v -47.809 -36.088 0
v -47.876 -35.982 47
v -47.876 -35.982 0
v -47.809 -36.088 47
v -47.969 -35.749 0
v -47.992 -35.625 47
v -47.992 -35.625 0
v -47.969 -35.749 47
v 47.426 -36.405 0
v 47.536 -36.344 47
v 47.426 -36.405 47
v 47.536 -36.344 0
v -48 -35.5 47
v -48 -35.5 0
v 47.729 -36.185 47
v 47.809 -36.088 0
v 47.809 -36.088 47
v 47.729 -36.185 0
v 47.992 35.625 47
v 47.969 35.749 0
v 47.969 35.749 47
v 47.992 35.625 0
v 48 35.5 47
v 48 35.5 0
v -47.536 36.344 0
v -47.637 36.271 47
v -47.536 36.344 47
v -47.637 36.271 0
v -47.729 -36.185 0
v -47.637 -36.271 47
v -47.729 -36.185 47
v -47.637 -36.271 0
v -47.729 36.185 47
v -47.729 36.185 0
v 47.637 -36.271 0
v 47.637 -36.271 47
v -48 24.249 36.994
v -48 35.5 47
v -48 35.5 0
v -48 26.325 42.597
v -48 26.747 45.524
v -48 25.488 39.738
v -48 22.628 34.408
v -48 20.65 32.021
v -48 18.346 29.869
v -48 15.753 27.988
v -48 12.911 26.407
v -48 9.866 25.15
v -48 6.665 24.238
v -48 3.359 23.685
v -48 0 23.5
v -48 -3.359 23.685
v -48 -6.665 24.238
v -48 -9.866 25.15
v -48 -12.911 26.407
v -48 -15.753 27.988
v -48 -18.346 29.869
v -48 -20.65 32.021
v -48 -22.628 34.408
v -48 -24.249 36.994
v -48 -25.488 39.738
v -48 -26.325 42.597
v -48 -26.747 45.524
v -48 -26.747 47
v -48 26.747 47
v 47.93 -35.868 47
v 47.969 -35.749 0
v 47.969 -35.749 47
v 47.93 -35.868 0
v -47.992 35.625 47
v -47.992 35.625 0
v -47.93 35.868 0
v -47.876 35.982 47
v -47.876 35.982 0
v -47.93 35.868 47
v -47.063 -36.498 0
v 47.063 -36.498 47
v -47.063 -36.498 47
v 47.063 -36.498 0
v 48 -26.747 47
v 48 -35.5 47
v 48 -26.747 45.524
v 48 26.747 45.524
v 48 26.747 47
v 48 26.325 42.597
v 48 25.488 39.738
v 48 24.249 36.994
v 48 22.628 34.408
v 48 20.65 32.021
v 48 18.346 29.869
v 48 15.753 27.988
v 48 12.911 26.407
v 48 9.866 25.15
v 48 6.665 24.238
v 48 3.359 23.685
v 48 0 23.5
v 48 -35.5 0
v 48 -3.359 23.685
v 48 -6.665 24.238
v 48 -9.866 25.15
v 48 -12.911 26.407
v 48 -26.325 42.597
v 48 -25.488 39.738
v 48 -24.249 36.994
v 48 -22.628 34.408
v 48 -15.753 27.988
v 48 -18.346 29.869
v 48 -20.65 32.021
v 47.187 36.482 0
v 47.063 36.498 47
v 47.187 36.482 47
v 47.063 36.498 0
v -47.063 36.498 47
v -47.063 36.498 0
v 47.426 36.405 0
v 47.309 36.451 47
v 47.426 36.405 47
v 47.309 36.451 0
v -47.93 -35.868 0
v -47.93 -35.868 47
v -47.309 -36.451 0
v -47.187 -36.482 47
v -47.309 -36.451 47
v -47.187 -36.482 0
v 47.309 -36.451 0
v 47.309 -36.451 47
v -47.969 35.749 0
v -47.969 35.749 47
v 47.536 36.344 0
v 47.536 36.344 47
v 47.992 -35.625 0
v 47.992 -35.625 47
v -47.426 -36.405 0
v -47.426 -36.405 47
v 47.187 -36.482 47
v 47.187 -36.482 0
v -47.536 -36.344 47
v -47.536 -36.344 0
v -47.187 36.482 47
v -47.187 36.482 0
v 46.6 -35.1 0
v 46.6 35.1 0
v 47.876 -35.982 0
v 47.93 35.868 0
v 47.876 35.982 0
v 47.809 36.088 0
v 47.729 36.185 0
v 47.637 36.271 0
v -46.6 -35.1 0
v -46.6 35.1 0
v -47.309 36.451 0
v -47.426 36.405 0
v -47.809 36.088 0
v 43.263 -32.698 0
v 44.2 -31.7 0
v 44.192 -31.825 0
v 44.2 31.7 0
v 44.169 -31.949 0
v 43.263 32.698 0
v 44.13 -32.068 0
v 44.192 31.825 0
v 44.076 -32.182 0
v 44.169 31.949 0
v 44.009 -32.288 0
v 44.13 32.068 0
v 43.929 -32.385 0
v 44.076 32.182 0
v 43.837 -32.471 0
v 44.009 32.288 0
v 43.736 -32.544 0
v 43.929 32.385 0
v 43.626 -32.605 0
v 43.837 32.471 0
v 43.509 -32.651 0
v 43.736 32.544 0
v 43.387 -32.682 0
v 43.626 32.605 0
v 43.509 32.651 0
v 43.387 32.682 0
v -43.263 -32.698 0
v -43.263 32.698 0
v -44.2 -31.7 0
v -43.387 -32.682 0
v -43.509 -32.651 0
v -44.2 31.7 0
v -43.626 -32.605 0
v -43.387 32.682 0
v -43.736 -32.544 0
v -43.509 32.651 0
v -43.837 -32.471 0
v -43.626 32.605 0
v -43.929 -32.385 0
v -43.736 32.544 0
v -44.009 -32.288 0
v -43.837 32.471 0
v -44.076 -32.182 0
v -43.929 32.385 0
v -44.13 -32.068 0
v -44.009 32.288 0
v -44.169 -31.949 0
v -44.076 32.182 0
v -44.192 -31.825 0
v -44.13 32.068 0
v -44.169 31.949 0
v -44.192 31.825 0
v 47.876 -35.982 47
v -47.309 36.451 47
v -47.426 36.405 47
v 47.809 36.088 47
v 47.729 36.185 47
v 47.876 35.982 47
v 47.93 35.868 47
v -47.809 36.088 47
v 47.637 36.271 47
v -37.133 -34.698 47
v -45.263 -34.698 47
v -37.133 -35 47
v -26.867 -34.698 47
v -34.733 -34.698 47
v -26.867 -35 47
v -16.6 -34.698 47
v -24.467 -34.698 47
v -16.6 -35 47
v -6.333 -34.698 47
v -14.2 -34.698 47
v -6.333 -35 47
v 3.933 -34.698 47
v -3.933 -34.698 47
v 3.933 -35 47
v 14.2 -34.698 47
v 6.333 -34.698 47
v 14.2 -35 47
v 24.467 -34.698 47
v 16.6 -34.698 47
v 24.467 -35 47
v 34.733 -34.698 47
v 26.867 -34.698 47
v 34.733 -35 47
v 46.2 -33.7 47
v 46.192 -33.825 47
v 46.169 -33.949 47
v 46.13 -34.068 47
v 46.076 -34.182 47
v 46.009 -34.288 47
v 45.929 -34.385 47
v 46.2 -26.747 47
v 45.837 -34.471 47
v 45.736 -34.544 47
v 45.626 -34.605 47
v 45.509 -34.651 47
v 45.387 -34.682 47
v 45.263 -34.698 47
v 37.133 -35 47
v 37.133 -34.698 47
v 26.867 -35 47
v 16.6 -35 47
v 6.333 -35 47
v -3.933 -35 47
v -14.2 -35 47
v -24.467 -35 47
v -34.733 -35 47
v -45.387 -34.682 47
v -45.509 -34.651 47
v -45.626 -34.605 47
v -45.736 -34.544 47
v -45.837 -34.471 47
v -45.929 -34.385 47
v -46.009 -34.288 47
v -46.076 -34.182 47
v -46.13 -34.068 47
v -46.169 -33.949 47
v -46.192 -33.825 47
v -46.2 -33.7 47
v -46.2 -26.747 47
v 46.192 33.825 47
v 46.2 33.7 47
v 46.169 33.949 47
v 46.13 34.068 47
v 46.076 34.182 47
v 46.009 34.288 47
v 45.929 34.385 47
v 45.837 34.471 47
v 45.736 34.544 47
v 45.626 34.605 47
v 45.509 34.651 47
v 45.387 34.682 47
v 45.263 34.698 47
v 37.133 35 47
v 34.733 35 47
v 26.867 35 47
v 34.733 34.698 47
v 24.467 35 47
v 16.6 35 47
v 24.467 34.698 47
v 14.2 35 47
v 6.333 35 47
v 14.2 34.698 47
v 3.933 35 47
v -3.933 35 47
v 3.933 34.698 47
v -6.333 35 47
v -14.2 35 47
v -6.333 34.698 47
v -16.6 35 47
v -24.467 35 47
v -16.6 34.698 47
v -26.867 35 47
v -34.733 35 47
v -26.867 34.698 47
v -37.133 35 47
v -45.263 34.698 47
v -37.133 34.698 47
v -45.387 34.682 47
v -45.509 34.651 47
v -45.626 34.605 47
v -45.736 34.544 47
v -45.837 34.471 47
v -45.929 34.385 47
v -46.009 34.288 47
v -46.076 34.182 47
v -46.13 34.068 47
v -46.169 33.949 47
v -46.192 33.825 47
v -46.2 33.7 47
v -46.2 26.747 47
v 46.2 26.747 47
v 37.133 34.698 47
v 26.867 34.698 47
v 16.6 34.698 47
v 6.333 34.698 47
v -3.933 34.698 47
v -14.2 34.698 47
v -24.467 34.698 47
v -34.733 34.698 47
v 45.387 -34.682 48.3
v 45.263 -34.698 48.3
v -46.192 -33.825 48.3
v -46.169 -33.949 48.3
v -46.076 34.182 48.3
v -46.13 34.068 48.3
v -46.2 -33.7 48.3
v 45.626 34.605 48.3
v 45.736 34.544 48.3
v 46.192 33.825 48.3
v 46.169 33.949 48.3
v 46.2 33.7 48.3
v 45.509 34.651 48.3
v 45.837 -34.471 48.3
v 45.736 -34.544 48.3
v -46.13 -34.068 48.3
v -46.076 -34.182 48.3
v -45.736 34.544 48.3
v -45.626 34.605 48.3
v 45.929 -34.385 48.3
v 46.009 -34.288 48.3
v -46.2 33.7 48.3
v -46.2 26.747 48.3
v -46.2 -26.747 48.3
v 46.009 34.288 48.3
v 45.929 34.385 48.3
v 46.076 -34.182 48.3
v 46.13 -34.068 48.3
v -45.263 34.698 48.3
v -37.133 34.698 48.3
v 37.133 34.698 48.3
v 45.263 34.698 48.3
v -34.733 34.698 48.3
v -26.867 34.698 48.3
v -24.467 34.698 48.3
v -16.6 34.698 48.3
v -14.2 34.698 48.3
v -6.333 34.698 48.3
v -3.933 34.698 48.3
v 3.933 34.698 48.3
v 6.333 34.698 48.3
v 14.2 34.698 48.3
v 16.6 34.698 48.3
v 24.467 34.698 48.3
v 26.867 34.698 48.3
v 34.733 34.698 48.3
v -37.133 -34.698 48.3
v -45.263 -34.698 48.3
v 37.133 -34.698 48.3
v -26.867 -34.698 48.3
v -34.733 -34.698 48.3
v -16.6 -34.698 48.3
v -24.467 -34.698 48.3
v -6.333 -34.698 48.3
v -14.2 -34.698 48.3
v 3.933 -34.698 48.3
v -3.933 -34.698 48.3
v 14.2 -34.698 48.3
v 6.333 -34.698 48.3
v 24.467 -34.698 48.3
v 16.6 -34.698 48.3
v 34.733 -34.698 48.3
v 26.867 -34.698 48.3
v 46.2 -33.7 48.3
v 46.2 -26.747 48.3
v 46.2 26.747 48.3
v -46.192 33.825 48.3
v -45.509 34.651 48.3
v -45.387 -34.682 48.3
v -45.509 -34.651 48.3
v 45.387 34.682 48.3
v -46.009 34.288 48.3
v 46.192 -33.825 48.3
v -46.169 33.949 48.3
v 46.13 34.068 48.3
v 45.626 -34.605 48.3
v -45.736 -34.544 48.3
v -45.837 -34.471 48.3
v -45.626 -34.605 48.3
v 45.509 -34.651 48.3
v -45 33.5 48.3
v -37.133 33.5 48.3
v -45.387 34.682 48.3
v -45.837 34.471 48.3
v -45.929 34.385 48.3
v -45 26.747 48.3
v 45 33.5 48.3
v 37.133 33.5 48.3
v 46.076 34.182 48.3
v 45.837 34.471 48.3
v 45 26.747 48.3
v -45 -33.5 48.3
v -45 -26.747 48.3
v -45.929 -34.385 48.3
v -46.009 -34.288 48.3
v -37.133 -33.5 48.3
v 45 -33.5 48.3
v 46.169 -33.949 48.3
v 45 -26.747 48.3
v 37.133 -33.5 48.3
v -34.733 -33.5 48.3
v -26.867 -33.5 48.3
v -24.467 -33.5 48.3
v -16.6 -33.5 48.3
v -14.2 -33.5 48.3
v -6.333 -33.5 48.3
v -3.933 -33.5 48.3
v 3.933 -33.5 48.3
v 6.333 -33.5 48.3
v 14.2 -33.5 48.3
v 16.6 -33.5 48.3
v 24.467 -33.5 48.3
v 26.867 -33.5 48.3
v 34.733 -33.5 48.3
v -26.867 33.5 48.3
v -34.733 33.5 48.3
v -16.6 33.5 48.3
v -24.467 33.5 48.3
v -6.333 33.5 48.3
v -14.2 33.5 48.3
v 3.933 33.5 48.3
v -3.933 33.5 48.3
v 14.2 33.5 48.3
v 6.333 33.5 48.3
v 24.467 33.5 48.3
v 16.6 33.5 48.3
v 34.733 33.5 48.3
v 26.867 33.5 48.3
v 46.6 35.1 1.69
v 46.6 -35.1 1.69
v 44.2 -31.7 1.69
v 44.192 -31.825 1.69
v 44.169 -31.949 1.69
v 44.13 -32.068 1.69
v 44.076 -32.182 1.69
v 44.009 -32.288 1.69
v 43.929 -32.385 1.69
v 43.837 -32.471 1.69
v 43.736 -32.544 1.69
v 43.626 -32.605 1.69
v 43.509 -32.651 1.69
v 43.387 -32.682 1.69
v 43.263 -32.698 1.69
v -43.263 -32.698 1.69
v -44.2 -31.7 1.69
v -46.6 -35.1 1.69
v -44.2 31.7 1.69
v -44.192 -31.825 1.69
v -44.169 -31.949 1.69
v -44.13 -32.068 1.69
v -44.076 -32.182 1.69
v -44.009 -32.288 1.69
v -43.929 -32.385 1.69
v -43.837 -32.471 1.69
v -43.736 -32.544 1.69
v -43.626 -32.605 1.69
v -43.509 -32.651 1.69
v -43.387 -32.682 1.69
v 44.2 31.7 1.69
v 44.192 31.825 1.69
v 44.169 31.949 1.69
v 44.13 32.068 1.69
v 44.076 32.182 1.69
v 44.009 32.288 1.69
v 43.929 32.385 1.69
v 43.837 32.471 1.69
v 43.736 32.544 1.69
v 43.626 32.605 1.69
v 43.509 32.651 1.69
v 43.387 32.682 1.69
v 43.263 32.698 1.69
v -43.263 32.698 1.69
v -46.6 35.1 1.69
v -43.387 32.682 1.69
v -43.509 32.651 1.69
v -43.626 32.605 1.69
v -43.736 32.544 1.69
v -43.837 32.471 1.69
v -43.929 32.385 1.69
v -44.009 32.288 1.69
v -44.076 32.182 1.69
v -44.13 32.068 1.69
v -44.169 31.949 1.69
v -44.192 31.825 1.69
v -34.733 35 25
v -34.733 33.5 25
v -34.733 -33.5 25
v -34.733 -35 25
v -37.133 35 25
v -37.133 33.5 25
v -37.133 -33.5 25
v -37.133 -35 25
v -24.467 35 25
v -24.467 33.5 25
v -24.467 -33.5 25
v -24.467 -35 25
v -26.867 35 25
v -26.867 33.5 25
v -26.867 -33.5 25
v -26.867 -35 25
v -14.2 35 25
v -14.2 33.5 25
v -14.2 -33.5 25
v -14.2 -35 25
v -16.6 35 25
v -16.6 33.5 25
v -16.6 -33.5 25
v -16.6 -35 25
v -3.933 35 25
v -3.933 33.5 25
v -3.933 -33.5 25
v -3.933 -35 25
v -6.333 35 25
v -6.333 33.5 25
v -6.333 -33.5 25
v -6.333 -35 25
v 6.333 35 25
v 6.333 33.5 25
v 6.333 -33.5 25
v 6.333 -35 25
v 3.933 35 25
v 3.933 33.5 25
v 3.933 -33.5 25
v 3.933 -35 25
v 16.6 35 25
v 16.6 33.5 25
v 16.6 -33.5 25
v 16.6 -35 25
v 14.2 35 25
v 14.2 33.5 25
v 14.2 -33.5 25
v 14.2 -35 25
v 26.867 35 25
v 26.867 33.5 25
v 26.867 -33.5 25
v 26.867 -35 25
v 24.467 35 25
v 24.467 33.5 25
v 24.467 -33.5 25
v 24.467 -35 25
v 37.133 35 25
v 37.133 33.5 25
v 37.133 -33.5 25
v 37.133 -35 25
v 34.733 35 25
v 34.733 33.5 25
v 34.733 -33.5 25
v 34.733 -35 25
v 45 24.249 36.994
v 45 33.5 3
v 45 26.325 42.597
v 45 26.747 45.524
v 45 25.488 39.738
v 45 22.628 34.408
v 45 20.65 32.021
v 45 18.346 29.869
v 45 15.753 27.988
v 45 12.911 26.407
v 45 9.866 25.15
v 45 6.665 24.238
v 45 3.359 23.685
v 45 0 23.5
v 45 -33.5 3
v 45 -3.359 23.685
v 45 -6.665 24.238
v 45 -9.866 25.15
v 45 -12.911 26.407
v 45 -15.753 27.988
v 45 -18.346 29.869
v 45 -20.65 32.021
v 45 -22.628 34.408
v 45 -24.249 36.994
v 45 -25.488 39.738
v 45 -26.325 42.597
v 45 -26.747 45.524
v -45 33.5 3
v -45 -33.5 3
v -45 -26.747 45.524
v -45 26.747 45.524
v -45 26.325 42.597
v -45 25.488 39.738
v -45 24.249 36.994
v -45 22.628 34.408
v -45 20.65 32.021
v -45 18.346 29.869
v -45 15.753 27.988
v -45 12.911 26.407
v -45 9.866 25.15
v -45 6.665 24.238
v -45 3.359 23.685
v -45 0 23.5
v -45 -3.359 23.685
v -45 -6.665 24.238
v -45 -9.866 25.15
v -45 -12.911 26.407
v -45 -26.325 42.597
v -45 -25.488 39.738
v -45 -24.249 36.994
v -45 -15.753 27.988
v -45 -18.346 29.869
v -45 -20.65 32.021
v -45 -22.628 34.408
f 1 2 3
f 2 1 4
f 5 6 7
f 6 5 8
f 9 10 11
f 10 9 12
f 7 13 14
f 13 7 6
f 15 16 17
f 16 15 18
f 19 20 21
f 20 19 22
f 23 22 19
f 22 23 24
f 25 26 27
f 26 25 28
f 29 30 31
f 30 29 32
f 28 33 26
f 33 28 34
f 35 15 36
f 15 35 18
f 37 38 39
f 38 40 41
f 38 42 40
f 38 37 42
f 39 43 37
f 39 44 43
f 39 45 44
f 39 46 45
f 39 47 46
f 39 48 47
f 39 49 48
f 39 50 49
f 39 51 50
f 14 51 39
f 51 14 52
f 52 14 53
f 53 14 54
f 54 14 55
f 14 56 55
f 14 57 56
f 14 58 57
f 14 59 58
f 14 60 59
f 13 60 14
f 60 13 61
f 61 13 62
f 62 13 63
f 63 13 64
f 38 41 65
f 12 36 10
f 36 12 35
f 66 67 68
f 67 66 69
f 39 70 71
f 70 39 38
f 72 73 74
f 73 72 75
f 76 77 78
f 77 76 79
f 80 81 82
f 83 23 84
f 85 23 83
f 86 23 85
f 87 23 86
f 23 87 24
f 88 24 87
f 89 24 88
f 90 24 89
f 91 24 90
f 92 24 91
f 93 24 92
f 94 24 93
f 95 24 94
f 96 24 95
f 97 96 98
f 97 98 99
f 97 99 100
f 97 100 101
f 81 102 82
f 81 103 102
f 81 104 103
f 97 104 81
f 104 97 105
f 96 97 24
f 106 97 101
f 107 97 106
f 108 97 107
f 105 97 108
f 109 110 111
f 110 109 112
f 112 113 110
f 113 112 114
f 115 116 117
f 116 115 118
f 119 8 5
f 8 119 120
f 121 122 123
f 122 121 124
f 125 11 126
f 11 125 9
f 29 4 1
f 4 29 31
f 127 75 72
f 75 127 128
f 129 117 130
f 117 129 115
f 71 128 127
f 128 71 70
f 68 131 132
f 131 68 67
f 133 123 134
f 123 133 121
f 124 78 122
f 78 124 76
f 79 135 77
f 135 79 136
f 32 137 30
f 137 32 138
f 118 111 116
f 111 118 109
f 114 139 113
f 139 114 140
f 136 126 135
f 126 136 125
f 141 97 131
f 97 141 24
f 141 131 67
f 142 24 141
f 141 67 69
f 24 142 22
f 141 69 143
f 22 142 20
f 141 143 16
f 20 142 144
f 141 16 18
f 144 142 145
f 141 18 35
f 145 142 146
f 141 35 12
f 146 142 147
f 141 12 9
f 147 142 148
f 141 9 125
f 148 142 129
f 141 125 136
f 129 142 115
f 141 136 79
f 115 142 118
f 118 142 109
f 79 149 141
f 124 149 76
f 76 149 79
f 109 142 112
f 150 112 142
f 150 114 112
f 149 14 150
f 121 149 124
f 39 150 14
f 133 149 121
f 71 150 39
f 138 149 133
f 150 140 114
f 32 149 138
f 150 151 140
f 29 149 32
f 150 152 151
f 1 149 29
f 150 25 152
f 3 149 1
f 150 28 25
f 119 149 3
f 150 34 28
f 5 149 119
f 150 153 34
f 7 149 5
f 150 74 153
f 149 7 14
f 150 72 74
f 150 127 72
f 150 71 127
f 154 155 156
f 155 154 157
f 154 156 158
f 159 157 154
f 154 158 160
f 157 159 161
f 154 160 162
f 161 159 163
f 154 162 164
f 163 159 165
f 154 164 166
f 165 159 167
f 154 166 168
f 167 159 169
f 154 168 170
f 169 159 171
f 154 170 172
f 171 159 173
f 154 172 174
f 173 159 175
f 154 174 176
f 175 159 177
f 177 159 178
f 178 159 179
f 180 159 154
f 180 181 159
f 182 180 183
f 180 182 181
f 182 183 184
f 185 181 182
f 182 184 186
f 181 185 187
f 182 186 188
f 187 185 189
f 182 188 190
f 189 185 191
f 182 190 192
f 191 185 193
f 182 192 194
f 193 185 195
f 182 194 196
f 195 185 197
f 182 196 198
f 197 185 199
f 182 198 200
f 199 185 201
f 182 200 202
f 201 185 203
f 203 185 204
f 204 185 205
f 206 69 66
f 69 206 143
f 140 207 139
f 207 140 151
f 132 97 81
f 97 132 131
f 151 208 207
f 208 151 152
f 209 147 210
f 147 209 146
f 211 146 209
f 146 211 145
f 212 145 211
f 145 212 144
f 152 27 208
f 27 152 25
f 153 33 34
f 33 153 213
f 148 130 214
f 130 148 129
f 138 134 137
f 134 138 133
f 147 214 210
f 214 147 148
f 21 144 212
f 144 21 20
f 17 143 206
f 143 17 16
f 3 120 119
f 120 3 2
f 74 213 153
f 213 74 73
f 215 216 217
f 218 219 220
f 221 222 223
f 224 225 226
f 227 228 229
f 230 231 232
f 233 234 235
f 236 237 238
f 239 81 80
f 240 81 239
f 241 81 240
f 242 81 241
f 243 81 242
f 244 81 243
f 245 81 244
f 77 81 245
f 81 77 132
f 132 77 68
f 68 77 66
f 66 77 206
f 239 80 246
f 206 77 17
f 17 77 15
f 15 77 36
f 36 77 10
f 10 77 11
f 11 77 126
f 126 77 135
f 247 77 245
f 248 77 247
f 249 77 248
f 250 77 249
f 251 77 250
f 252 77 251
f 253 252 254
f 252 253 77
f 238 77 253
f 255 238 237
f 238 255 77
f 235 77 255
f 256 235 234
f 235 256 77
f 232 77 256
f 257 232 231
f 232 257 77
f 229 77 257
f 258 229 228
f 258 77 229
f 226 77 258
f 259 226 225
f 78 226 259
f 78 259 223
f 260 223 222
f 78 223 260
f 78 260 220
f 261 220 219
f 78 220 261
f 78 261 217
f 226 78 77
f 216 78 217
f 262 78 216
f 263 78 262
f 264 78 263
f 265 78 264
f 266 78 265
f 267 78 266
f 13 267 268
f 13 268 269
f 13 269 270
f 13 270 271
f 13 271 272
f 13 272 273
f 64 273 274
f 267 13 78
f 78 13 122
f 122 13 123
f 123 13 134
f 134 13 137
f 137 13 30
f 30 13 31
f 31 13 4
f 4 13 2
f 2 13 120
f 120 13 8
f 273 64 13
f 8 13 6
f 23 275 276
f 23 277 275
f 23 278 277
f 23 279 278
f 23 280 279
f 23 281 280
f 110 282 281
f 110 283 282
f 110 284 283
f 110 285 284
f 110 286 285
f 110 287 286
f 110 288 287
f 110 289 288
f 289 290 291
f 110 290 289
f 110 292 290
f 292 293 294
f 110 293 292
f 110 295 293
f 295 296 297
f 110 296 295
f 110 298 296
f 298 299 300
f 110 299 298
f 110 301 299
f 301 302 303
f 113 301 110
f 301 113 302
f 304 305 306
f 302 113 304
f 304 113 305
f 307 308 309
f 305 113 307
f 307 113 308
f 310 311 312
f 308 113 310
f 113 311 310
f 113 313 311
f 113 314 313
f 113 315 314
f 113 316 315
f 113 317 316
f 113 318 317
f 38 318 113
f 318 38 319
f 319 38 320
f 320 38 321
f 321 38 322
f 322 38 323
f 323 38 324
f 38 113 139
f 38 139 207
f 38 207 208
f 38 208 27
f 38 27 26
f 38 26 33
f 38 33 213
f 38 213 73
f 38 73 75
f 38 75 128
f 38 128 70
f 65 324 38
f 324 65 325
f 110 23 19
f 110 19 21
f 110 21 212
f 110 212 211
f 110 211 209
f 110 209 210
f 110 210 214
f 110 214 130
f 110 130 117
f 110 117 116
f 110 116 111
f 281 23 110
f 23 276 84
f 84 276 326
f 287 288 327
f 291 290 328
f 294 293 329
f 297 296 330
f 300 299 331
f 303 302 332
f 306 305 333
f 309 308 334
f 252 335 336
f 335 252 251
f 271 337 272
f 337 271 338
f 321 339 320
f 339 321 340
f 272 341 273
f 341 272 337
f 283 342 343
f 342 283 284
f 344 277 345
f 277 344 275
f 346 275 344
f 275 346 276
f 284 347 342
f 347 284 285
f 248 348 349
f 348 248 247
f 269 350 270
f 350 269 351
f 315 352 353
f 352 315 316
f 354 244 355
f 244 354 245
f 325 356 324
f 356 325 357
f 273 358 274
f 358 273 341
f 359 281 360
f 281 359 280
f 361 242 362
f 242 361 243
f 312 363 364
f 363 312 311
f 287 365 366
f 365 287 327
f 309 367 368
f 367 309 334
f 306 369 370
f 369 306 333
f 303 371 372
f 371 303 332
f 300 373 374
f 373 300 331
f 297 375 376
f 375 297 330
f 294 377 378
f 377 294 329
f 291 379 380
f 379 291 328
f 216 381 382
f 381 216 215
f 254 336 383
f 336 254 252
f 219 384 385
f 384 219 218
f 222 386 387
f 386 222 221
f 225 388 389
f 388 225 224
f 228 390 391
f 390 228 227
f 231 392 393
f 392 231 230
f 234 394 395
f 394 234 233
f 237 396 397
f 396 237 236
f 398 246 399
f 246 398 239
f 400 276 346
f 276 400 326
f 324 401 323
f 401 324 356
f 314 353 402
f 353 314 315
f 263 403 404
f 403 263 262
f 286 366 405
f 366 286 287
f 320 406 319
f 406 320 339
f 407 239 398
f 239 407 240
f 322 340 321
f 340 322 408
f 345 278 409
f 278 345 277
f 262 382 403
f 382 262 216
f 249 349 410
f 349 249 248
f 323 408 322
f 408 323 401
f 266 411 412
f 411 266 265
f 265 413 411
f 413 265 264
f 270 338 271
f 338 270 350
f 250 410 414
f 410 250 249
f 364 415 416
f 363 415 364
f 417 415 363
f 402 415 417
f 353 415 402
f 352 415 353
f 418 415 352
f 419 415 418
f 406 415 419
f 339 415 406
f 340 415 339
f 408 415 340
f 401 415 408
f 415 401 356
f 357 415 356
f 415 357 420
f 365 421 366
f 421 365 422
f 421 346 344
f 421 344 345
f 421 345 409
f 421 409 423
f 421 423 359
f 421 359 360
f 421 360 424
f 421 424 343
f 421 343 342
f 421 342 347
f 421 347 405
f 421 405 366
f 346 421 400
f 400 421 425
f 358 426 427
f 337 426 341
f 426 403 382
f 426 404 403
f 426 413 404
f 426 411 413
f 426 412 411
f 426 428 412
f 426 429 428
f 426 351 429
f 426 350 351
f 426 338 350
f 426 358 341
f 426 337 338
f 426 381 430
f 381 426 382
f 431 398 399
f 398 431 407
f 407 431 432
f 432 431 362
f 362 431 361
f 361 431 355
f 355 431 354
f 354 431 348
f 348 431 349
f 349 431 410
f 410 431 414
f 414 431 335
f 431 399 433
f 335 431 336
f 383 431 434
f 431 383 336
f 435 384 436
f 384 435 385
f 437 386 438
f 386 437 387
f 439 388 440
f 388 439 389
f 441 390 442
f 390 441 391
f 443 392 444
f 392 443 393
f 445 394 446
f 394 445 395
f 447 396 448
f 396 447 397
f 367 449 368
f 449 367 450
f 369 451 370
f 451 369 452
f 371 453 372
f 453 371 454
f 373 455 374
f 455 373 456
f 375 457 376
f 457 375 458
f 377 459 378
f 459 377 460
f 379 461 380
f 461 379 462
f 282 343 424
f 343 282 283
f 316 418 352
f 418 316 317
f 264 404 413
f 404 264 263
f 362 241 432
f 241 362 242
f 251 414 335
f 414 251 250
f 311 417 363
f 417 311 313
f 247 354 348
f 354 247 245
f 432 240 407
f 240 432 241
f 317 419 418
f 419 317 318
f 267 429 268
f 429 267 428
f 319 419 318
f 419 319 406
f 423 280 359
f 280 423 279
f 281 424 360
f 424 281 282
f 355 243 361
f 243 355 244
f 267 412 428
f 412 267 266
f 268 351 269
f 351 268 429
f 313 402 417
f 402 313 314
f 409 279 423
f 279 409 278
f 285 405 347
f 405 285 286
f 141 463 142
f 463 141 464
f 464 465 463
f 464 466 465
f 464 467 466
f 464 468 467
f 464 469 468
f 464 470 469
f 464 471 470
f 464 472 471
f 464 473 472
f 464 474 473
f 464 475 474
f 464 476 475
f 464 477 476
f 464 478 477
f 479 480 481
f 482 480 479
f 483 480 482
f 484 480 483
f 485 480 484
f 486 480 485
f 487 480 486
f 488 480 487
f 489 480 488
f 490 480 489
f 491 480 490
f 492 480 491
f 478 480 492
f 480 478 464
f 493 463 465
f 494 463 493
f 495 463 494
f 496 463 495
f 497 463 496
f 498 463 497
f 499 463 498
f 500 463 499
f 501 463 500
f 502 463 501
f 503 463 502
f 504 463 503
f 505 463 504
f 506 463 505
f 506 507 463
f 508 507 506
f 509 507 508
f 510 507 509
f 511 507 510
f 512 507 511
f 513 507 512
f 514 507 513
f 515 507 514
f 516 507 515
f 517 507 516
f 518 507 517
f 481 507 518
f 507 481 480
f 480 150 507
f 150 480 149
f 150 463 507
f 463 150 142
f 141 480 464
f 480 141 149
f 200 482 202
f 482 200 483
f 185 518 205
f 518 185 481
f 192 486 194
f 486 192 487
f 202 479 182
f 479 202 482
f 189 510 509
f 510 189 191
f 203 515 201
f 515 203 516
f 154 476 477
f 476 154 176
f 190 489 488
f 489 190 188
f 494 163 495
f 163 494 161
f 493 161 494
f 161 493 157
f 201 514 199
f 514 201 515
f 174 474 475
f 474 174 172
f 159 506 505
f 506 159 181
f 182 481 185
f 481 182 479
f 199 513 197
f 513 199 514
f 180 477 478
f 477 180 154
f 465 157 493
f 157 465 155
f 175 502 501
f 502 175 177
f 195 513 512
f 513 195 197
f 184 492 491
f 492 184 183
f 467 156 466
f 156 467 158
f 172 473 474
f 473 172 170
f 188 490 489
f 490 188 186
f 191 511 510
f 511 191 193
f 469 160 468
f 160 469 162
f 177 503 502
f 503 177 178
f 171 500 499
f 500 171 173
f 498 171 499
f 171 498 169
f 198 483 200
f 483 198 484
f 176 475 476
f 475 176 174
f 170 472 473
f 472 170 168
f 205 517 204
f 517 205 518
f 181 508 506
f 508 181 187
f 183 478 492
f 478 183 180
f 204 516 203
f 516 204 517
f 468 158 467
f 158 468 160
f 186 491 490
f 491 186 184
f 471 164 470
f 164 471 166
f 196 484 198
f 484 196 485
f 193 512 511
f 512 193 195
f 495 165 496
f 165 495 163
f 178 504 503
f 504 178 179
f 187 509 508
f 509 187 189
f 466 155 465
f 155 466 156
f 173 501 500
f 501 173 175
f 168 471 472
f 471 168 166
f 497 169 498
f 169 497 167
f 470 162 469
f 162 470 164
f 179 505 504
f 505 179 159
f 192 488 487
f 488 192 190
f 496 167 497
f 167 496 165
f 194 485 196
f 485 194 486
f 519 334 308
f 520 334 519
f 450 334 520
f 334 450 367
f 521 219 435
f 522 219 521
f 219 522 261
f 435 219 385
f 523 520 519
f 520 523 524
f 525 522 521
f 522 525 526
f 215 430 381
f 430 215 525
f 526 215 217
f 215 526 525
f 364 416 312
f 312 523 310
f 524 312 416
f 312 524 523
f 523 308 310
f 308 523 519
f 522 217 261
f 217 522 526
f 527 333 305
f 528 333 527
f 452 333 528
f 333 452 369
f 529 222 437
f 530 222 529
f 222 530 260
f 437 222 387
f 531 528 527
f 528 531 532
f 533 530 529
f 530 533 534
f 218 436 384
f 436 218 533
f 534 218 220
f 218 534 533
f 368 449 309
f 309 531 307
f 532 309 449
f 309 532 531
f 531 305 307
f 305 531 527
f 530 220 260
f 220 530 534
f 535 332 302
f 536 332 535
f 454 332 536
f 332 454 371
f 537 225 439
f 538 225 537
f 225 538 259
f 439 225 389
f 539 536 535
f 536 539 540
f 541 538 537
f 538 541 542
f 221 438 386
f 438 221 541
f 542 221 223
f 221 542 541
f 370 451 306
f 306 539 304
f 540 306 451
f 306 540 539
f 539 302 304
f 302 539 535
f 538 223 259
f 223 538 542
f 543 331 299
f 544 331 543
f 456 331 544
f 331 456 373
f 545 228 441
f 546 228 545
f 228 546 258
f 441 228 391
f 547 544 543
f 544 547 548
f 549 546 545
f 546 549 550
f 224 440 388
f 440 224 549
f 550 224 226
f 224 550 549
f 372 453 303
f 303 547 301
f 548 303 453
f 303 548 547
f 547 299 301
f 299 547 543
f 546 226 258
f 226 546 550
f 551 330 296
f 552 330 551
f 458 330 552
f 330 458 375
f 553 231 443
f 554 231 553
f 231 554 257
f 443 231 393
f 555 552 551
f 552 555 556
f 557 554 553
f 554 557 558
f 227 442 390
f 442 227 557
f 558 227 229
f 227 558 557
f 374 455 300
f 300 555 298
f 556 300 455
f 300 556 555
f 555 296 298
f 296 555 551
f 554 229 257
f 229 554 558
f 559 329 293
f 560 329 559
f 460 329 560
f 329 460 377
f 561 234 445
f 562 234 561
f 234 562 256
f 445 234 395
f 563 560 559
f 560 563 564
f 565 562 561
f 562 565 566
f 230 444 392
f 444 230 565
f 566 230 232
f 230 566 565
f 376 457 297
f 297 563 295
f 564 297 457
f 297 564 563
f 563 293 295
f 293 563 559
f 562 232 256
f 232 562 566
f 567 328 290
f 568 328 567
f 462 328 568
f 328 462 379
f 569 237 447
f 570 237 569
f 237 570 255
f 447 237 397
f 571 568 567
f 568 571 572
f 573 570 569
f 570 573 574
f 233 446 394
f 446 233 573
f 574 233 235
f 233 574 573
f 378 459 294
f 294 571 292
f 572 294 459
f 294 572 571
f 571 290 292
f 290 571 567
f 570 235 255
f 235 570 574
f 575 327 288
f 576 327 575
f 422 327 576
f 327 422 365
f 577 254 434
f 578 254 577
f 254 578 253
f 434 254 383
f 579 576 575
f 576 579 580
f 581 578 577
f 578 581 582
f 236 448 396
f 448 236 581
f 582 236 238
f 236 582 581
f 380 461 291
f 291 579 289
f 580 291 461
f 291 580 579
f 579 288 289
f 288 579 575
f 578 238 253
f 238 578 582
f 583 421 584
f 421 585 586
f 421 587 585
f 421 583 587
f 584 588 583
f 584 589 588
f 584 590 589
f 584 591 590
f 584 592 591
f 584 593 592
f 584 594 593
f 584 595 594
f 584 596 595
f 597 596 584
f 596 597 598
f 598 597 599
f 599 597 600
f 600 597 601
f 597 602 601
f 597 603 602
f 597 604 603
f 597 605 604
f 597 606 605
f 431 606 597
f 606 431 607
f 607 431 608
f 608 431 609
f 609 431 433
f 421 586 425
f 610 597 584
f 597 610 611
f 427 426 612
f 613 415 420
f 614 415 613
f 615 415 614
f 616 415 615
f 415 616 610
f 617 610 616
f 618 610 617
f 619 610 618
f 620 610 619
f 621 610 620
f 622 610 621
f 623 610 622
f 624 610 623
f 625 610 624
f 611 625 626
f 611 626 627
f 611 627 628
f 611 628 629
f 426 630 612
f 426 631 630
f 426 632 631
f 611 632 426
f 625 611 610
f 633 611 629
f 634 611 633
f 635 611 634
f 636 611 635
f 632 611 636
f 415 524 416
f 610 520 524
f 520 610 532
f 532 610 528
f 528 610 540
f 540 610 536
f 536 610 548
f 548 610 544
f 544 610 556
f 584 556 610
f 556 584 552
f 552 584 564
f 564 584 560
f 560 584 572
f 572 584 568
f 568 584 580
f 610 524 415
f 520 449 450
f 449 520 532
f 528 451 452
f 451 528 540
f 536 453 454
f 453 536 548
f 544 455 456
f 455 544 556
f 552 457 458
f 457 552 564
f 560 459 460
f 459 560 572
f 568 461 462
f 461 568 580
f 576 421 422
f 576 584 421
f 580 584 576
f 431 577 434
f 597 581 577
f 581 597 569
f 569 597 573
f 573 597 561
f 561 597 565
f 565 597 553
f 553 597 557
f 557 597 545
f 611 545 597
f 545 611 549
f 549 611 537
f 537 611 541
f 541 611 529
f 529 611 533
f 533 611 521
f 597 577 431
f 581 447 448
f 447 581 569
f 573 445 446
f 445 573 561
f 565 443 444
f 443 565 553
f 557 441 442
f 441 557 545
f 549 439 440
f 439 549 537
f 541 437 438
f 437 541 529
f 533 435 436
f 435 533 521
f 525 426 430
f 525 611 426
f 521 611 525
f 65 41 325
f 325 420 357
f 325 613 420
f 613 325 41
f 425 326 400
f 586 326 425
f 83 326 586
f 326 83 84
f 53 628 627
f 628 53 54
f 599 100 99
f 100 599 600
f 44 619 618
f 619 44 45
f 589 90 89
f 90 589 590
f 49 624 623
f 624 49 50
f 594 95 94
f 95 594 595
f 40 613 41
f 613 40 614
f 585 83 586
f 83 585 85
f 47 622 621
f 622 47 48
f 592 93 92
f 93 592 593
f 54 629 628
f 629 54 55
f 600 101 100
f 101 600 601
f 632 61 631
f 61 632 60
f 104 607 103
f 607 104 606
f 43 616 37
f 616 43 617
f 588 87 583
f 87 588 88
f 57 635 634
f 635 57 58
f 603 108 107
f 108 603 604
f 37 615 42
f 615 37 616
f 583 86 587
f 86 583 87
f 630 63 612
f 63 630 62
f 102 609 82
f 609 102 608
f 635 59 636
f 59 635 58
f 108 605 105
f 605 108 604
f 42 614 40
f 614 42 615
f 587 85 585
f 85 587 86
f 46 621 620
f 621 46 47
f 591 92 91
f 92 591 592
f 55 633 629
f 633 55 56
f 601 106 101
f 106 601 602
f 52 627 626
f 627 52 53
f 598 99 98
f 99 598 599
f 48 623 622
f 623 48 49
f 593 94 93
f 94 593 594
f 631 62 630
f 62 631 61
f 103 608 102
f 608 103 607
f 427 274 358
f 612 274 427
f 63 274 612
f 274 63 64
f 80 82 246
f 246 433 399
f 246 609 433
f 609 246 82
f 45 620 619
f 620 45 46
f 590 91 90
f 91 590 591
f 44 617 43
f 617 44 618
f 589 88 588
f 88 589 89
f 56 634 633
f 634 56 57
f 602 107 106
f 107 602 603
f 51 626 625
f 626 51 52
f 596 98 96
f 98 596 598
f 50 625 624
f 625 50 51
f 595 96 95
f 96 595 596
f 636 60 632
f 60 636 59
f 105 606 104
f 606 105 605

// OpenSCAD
// Which one would you like to see?
part = "first"; // [first:Box Only,second:Divider Only]




box_length = 96; //box length
box_width = 73; //box width
box_height = 47; //box height

//wall thickness in mm
box_thickness = 3; //box wall thickness

//corner rounded radius in mm
box_rounded_corner = 1; //rounded corner radius

//extra space on each side for divider slots
tolerance = 0.2; //extra space on divider slots

//extra space on the stacking rim (bottom)
rim_tolerance = 0.4; //extra space on the rim

//shortens the divider height in mm
div_height_tolerance = 2;


div_length = box_width - (2 * box_thickness) - (2 * tolerance);
div_height = box_height - box_thickness - div_height_tolerance; //divider height
div_thickness = 2; //divider thickness

//the number of sections, not the number of dividers 
number_of_slots = 9;

//Enable stacking?
stacking = true; // [true,false]

//Cut circles in the box ends?
cut_ends = true; // [true,false]

//Cut circles in the divider ends?
div_cut_ends = "top"; // [top,bottom,both]

stack_rim_thickness = (box_thickness < 3) ? box_thickness / 2 : 1.2; //either half the wall thickness or 1.2
	
//the lower rim groove is 0.4mm deeper than this. do not exceed your wall thickness!
upper_rim_height = 1.3;
lower_rim_height = upper_rim_height + 0.4;





//divider();
//build_box();

print_part();


module print_part()
 {
    if (part == "first") build_box();
    if (part == "second") divider();
 }

module lower_rim()
{
	translate([0,0,0])
		difference()
		{
			translate([0,0,lower_rim_height/2-.01])
			cube([box_length - ((box_thickness - stack_rim_thickness) * 2) + rim_tolerance * 2,box_width - (box_thickness - stack_rim_thickness) * 2 + rim_tolerance*2 ,lower_rim_height], center = true);
			roundedRect([box_length - ((box_thickness - stack_rim_thickness) * 2) - rim_tolerance * 4 - stack_rim_thickness * 2,box_width - (box_thickness - stack_rim_thickness) * 2 - rim_tolerance*4 - stack_rim_thickness * 2,lower_rim_height+.1], box_rounded_corner, $fn=50);
		}


}
module upper_rim()
{
	translate([0,0,box_height])
		roundedRect([box_length - (box_thickness - stack_rim_thickness) * 2,box_width -  (box_thickness - stack_rim_thickness) * 2,upper_rim_height], box_rounded_corner, $fn=50);
}

module main_cube()
{
	difference()
	{
		union()
		{
			roundedRect([box_length, box_width, box_height], box_rounded_corner, $fn=50);
			if(stacking) upper_rim();
		}
	
		if(stacking) lower_rim();
	}
		
	
	
}

module build_box ()
{
	slot_thickness = div_thickness + (tolerance * 2);
	slot_spacing = ((box_length - (box_thickness * 2)) - ((number_of_slots - 1) * slot_thickness)) / number_of_slots;
	$fn = 50;
	stack_rim_thickness = (box_thickness < 3) ? box_thickness / 2 : 1.5;
		
	difference() {

		
		main_cube();
		

		translate ([0,0,box_thickness+box_height/2]) 
			cube ([box_length - (2 * box_thickness), box_width - (2 * box_thickness), box_height], center = true);
		if (cut_ends)
		{
			hull()
			{
				translate([0,0,box_height])
					rotate(a=[0,90,0])
						scale(v=[box_height,(box_width - (box_thickness * 2))*.8,1])
							cylinder (h = box_length+2, r = .5, $fn = 50, center = true);
				translate([0,0,box_height+50])
					rotate(a=[0,90,0])
						scale(v=[box_height,(box_width - (box_thickness * 2))*.8,1])
							cylinder (h = box_length+2, r = .5, $fn = 50, center = true);
			}
		}
		
		if (number_of_slots > 1)
		{
			translate([-((number_of_slots-2) * (slot_thickness + slot_spacing))/2,0,box_height])
				for ( i = [0 : number_of_slots-2] )
				{
					translate([i * (slot_thickness + slot_spacing),0,0])
					cube ([slot_thickness, box_width - box_thickness, (box_height - box_thickness)], center = true); 
				}
		}
	}

}

module divider ()
{
	tab_length = (box_thickness / 2) - tolerance;
	tab_width = div_thickness;
	tab_height = ((box_height - box_thickness) / 2) - (box_height - box_thickness - div_height);
	
	translate([0,0,(div_height / 2) + box_thickness + div_height_tolerance])
	difference() {
	
		union() {
			cube ([div_thickness, div_length, div_height], center = true);
				translate([-div_thickness / 2, div_length / 2, (div_height / 2) - tab_height])	
					cube ([tab_width, tab_length, tab_height ]);
			mirror ([0,1,0])
				translate([-div_thickness / 2, div_length / 2, (div_height / 2) - tab_height])	
					cube ([tab_width, tab_length, tab_height ]);
			}
		
		if ((div_cut_ends == "top") || (div_cut_ends == "both"))
		translate([0,0,div_height / 2 ])
			rotate(a=[0,90,0])
				scale(v=[div_height * 0.7,(div_length * 0.6),1])
					cylinder (h = div_thickness+2, r = .5, $fn = 50, center = true);

	if ((div_cut_ends == "bottom") || (div_cut_ends == "both"))
		translate([0,0,-div_height / 2 ])
			rotate(a=[0,90,0])
				scale(v=[div_height * 0.7,(div_length * 0.6),1])
					cylinder (h = div_thickness+2, r = .5, $fn = 50, center = true);
		}

	}

module roundedRect(size, radius)
{
	x = size[0];
	y = size[1];
	z = size[2];

	linear_extrude(height=z)
	hull()
	{
		// place 4 circles in the corners, with the given radius
		translate([(-x/2)+(radius), (-y/2)+(radius), 0])
		circle(r=radius);
	
		translate([(x/2)-(radius), (-y/2)+(radius), 0])
		circle(r=radius);
	
		translate([(-x/2)+(radius), (y/2)-(radius), 0])
		circle(r=radius);
	
		translate([(x/2)-(radius), (y/2)-(radius), 0])
		circle(r=radius);
	}
}
